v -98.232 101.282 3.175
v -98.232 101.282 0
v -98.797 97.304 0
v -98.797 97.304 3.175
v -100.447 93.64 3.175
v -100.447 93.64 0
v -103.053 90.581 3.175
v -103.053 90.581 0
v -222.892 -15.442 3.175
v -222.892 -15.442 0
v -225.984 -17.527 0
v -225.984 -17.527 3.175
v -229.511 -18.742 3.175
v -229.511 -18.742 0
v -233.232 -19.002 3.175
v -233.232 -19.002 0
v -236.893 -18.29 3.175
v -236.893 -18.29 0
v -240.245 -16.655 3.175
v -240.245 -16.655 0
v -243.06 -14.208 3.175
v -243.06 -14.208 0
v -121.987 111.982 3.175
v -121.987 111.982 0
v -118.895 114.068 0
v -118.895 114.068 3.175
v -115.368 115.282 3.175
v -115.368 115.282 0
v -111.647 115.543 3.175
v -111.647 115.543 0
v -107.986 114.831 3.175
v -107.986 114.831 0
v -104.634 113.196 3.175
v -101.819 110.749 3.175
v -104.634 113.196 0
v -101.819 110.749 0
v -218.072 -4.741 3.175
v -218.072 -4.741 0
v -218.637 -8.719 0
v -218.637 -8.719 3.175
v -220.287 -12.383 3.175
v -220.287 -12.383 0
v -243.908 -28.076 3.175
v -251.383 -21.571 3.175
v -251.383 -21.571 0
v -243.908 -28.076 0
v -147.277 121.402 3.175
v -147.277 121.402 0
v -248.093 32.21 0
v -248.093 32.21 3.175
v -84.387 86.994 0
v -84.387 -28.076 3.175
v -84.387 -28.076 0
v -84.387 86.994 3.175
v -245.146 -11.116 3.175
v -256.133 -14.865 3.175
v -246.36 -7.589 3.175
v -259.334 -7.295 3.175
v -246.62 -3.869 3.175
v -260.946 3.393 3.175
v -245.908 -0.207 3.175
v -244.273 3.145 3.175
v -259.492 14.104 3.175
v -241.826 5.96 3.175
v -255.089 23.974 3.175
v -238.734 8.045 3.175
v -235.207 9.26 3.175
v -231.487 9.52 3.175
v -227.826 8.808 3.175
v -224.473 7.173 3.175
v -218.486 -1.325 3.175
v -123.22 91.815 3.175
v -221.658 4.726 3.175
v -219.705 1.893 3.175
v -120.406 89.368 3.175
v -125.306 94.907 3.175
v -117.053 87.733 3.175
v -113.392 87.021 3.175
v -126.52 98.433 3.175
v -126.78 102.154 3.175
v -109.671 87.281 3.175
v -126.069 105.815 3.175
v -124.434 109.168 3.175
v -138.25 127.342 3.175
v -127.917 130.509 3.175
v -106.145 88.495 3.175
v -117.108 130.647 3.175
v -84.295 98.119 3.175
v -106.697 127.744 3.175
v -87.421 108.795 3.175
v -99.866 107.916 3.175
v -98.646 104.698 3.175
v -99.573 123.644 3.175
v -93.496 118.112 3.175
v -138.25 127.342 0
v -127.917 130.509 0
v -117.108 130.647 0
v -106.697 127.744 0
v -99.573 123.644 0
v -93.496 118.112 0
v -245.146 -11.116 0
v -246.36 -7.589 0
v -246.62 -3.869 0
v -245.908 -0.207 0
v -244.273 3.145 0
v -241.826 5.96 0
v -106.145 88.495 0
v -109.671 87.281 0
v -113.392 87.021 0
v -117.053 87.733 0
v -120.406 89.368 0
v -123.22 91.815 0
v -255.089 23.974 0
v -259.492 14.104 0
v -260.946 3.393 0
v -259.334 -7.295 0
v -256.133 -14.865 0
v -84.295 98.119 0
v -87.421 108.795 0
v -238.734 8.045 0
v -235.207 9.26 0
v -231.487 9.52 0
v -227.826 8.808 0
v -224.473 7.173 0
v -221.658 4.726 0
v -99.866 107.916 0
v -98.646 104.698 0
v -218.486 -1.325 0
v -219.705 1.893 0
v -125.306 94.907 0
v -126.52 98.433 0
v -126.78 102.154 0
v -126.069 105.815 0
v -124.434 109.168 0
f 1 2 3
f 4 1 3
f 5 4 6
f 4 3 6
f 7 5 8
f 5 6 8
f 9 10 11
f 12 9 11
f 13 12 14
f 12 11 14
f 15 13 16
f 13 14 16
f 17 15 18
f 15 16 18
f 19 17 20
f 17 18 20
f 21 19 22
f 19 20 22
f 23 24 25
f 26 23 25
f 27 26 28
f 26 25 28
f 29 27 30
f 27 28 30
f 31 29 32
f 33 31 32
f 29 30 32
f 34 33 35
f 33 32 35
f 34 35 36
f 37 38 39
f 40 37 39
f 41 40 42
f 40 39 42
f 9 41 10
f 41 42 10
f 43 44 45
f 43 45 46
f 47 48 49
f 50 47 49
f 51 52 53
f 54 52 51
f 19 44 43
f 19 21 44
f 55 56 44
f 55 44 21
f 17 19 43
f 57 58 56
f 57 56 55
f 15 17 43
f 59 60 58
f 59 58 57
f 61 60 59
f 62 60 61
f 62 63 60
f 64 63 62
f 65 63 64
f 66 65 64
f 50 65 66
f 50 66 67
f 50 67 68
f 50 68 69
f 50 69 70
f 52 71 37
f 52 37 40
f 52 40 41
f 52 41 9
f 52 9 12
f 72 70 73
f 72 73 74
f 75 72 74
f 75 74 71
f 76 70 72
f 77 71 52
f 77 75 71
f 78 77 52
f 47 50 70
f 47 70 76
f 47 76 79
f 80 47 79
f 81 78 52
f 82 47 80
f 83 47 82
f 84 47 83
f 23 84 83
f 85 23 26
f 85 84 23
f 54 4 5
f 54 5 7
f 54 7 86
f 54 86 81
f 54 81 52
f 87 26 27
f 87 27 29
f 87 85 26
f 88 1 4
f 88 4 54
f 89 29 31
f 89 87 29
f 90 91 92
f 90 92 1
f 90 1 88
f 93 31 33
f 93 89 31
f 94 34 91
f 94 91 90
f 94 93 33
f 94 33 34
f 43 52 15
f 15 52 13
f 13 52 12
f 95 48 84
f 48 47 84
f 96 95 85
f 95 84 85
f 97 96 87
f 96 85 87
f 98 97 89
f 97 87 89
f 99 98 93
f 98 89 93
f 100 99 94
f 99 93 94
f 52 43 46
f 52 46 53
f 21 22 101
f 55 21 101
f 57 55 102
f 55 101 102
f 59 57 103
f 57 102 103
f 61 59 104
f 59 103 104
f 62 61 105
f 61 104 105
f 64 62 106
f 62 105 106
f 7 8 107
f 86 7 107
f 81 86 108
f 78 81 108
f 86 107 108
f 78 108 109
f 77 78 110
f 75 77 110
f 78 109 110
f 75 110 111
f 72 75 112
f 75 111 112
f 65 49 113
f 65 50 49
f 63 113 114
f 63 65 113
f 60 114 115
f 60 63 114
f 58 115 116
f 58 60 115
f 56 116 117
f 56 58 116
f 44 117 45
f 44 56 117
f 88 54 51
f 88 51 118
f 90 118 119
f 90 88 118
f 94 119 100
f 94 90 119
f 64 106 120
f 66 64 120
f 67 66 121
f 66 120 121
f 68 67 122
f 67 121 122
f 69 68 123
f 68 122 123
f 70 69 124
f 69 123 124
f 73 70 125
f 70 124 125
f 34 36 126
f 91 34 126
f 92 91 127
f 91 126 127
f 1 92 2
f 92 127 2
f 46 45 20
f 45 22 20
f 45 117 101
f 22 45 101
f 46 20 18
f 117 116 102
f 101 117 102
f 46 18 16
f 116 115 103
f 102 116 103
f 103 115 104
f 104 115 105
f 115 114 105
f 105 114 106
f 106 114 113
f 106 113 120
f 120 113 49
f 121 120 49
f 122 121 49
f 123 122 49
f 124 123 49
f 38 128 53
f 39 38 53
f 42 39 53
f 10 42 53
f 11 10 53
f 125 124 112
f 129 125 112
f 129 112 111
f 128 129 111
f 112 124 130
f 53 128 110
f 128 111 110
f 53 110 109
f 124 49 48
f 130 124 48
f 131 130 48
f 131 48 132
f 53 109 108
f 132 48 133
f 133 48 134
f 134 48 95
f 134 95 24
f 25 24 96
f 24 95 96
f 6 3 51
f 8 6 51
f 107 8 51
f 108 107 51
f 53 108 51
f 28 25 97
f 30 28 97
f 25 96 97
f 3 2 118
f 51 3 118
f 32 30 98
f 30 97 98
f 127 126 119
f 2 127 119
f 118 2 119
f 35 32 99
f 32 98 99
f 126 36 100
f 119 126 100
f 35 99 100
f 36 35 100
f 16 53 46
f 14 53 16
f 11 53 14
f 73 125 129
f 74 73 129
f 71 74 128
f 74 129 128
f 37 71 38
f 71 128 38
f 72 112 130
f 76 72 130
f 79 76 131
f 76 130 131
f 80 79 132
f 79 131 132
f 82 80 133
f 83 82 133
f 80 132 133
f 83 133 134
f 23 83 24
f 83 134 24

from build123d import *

# Parameters (mm, degrees)
BOSS_EXTRUDE1_DEPTH = 3.175
FILLET1_R           = 38.1
SKETCH2_W           = 42.672654426
SKETCH2_H           = 6.35
CUT_EXTRUDE1_DEPTH  = 3.175
BOSS_EXTRUDE2_DEPTH = 3.175


with BuildPart() as part:
    # Sketch1 → Boss-Extrude1 (new body)
    with BuildSketch(Plane.XY):
        with BuildLine():
            Line((-221.658355151, 4.726030951), (-123.220415709, 91.814619456))
            ThreePointArc((-123.220415709, 91.814619456), (-126.780447272, 102.154073831), (-121.98667143, 111.982494593))
            Line((-121.98667143, 111.982494593), (-137.765113811, 129.81717744))
            Line((-137.765113811, 129.81717744), (-257.60467267, 23.794458078))
            Line((-257.60467267, 23.794458078), (-241.826230288, 5.95977523))
            ThreePointArc((-241.826230288, 5.95977523), (-231.486775913, 9.519806794), (-221.658355151, 4.726030951))
        make_face()
        with BuildLine():
            Line((-207.113657049, -33.276527034), (-87.274098191, 72.746192329))
            Line((-87.274098191, 72.746192329), (-103.052540572, 90.580875176))
            ThreePointArc((-103.052540572, 90.580875176), (-113.391994947, 87.020843613), (-123.220415709, 91.814619456))
            Line((-123.220415709, 91.814619456), (-221.658355151, 4.726030951))
            ThreePointArc((-221.658355151, 4.726030951), (-218.998392521, 0.320824743), (-218.071664859, -4.741034478))
            ThreePointArc((-218.071664859, -4.741034478), (-219.332397157, -10.60925222), (-222.892099431, -15.441844187))
            Line((-222.892099431, -15.441844187), (-207.113657049, -33.276527034))
        make_face()
        with BuildLine():
            Line((-226.137318753, -50.106865574), (-207.113657049, -33.276527034))
            Line((-207.113657049, -33.276527034), (-222.892099431, -15.441844187))
            ThreePointArc((-222.892099431, -15.441844187), (-233.231553806, -19.00187575), (-243.059974568, -14.208099907))
            Line((-243.059974568, -14.208099907), (-251.382826563, -21.571373018))
            Line((-251.382826563, -21.571373018), (-226.137318753, -50.106865574))
        make_face()
        with BuildLine():
            Line((-251.382826563, -21.571373018), (-243.059974568, -14.208099907))
            ThreePointArc((-243.059974568, -14.208099907), (-246.620006131, -3.868645532), (-241.826230288, 5.95977523))
            Line((-241.826230288, 5.95977523), (-257.60467267, 23.794458078))
            Line((-257.60467267, 23.794458078), (-276.628334373, 6.964119538))
            Line((-276.628334373, 6.964119538), (-251.382826563, -21.571373018))
        make_face()
        with BuildLine():
            Line((-101.818796292, 110.748750313), (-93.495944297, 118.112023425))
            Line((-93.495944297, 118.112023425), (-118.741452107, 146.647515981))
            Line((-118.741452107, 146.647515981), (-137.765113811, 129.81717744))
            Line((-137.765113811, 129.81717744), (-121.98667143, 111.982494593))
            ThreePointArc((-121.98667143, 111.982494593), (-111.647217054, 115.542526156), (-101.818796292, 110.748750313))
        make_face()
        with BuildLine():
            Line((-103.052540572, 90.580875176), (-87.274098191, 72.746192329))
            Line((-87.274098191, 72.746192329), (-68.250436487, 89.576530869))
            Line((-68.250436487, 89.576530869), (-93.495944297, 118.112023425))
            Line((-93.495944297, 118.112023425), (-101.818796292, 110.748750313))
            ThreePointArc((-101.818796292, 110.748750313), (-99.158833662, 106.343544105), (-98.232106001, 101.281684885))
            ThreePointArc((-98.232106001, 101.281684885), (-99.492838298, 95.413467143), (-103.052540572, 90.580875176))
        make_face()
    extrude(amount=BOSS_EXTRUDE1_DEPTH)

    # Fillet1
    fillet1_edges = [part.edges().sort_by_distance(p)[0] for p in [
        (-276.628334373, 6.964119538, 1.5875),
        (-226.137318753, -50.106865574, 1.5875),
        (-68.250436487, 89.576530869, 1.5875),
        (-118.741452107, 146.647515981, 1.5875),
    ]]
    fillet(fillet1_edges, radius=FILLET1_R - 0.0001)  # a hair under: the kernel refuses the full size

    # Sketch2 → Cut-Extrude1 (cut)
    with BuildSketch(Plane.XY.offset(3.175)):
        with Locations((-222.571574213, -31.250865208)):
            Rectangle(SKETCH2_W, SKETCH2_H)
    extrude(amount=-CUT_EXTRUDE1_DEPTH, mode=Mode.SUBTRACT)


with BuildPart() as cut_extrude1_kept_piece:
    # of the separate pieces the step leaves, the one the design keeps (cut_extrude1_pieces_kept)
    add(part.part.solids().sort_by_distance((-251.382760302, -21.571447914, 0))[0])

    # Sketch3 → Boss-Extrude2 (add)
    with BuildSketch(Plane.XY.offset(3.175)):
        with BuildLine():
            Line((-84.386706387, -28.075865208), (-84.386706387, 86.994184885))
            ThreePointArc((-84.386706387, 86.994184885), (-88.606891327, 74.579641731), (-96.785929043, 64.331023059))
            Line((-96.785929043, 64.331023059), (-197.601826197, -24.861357764))
            ThreePointArc((-197.601826197, -24.861357764), (-199.63857671, -26.541152476), (-201.786766589, -28.075865208))
            Line((-201.786766589, -28.075865208), (-84.386706387, -28.075865208))
        make_face()
    extrude(amount=-BOSS_EXTRUDE2_DEPTH)


solid = cut_extrude1_kept_piece.part
